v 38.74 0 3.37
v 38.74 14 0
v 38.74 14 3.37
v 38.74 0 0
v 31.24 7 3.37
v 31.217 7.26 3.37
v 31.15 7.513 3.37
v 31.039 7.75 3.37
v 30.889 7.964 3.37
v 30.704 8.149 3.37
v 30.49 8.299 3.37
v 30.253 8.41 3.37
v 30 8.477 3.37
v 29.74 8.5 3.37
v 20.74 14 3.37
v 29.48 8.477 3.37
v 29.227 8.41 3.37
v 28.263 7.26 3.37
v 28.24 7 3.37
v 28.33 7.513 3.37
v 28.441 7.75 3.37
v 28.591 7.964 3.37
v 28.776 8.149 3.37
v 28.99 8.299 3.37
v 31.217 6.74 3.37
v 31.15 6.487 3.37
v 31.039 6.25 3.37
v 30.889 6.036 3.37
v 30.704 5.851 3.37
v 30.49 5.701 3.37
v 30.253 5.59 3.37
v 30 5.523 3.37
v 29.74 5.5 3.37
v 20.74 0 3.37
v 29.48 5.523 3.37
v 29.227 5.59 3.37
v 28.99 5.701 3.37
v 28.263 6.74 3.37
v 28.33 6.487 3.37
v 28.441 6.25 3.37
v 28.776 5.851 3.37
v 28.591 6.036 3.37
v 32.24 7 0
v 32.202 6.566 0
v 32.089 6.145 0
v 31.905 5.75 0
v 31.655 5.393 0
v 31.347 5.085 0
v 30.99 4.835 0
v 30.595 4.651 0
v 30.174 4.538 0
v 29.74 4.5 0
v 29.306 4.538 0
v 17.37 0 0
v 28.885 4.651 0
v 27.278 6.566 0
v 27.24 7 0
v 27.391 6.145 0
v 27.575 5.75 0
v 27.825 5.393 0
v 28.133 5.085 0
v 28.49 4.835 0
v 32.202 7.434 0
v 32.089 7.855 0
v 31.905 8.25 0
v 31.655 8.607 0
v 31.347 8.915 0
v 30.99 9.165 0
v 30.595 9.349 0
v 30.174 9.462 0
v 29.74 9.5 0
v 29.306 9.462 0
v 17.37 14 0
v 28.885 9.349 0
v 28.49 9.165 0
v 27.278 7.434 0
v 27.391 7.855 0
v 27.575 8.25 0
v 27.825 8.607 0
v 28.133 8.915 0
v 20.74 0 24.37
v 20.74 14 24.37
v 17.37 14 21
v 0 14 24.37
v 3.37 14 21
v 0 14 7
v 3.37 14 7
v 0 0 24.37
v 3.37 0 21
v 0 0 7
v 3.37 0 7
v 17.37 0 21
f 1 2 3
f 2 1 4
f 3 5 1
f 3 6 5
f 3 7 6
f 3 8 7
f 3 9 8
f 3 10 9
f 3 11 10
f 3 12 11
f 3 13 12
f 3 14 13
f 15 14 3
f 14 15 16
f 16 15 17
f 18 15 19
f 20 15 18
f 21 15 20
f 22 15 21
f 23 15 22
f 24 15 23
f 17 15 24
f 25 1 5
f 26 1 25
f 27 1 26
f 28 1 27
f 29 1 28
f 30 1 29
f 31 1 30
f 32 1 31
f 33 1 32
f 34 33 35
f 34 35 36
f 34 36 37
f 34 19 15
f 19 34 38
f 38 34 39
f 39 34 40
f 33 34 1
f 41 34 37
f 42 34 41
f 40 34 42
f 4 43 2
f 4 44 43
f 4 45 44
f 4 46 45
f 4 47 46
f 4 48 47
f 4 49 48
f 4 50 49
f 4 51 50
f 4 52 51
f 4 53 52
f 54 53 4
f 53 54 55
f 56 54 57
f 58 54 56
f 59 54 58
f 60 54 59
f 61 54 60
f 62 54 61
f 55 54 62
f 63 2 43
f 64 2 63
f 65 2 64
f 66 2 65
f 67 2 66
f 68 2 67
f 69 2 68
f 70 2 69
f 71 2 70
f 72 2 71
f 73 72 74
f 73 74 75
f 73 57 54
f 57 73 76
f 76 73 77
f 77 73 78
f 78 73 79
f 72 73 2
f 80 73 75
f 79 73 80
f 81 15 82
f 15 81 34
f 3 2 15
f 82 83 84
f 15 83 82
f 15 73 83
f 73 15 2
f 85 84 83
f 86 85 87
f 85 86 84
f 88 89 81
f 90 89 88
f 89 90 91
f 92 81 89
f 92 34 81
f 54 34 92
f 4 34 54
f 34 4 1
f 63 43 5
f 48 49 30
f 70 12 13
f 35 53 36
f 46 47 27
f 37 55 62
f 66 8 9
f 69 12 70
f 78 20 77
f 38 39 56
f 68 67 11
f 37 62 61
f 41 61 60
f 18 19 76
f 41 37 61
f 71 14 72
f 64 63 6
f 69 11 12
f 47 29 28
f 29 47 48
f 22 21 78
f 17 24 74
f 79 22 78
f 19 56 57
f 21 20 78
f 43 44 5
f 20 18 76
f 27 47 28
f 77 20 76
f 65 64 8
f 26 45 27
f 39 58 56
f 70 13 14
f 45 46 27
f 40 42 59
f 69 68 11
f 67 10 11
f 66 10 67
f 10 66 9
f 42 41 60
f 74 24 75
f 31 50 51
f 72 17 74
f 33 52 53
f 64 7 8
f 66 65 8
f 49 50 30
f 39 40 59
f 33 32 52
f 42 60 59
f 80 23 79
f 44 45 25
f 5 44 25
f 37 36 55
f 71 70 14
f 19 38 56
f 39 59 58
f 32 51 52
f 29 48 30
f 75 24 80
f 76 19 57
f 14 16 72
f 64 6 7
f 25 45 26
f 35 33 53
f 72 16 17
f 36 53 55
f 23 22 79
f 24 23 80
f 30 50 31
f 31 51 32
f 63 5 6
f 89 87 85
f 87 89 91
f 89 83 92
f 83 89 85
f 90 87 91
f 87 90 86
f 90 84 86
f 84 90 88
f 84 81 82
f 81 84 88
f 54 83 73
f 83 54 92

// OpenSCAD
// file: PrusaImport.scad
$fn=36;

//Imports for thin wall thickness with layer height 0.15:

wt2=0.87;
wt3=1.29;
wt4=1.7;
wt5=2.12;
wt6=2.54;
wt7=2.96;
wt8=3.37;
wt9=3.79;
wt10=4.21;
// main file
include <PrusaImport.scad>

//Thickness
t=wt8; //8 lines, as the connector on the desk is about 3.3 this is a good value not to scratch the wood with attached connector...

spar=14;
wood=18;

s1=5;
s2=3;

z=7; //Zusätzliche Tiefe für die Platte
//z=11 +4 für nächste Stufe

//left
translate([0,0,0+z])
cube([t,spar,spar]);

//top
translate([0,0,spar+z])
cube([spar+t+t,spar,t]);

//right
translate([spar+t,0,0])
cube([t,spar,spar+z]);

//bottom
module bottom()
{
color("blue")
translate([spar+t+t,0,0])
cube([wood, spar, t]);
}

module schraube()
{
    translate([spar+t+t+(wood/2),spar/2,0])
    color("red")
    rotate([0,0,0])
    cylinder(h=t, d1=s1, d2=s2);
}

difference()
{
bottom();
schraube();
}
